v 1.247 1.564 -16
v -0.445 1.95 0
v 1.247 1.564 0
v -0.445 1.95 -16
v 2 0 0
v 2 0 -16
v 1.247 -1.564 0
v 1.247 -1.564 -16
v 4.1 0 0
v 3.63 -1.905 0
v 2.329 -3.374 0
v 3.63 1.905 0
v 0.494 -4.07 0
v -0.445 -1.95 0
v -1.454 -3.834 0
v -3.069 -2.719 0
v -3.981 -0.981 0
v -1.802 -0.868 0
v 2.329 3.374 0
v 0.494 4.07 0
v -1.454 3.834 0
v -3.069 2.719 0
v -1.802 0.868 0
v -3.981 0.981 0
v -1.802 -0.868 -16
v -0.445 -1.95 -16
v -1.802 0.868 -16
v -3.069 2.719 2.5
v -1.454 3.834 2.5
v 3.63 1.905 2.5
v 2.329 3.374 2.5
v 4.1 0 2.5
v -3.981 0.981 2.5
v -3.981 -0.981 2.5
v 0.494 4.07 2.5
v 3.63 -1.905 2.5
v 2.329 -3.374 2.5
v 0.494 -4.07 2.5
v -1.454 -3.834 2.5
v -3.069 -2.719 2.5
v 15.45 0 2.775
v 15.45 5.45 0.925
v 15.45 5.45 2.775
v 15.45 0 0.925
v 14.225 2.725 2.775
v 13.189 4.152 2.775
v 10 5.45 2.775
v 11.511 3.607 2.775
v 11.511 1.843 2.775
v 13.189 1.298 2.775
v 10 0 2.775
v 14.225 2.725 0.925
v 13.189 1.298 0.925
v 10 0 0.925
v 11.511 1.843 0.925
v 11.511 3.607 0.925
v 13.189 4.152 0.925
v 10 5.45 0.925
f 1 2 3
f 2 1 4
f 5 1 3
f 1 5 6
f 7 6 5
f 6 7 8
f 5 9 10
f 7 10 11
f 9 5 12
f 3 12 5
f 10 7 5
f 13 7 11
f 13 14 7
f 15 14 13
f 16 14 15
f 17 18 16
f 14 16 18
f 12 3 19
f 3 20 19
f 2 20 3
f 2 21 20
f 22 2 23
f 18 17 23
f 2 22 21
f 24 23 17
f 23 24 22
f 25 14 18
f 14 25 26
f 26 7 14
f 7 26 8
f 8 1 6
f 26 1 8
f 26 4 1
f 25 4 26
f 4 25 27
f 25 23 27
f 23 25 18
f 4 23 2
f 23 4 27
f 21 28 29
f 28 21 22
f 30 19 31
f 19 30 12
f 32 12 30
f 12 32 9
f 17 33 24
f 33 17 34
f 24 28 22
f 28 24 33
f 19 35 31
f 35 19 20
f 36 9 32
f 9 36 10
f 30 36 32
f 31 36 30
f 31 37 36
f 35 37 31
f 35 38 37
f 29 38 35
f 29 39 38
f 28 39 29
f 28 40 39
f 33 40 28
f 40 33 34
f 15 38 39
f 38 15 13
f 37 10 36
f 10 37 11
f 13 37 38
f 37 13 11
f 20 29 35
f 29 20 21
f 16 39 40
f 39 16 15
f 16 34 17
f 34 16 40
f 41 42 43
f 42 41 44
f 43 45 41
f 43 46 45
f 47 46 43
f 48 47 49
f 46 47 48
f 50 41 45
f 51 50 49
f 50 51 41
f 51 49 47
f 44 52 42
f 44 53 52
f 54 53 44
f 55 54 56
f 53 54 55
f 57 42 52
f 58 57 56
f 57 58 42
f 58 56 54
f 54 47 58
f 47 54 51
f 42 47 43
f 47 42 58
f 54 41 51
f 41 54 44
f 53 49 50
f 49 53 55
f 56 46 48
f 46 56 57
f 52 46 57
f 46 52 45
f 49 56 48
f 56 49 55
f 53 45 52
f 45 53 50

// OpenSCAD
module m3_square_nut() {
    color("Silver") {
        translate([0,0,1.85/2]) {
            difference() {
                cube([5.45,5.45,1.85]);
                translate([5.45/2,5.45/2,-5])cylinder(d=3, h=10);
            }
        }
    }
}

module plastic_screw() {
    color("Grey") translate([0,0,-16]){
        cylinder(h=16, d=4);
        translate([0,0,16])cylinder(h=2.5, d=8.2);
    }
}

plastic_screw();

translate([10,0,0]) m3_square_nut();
